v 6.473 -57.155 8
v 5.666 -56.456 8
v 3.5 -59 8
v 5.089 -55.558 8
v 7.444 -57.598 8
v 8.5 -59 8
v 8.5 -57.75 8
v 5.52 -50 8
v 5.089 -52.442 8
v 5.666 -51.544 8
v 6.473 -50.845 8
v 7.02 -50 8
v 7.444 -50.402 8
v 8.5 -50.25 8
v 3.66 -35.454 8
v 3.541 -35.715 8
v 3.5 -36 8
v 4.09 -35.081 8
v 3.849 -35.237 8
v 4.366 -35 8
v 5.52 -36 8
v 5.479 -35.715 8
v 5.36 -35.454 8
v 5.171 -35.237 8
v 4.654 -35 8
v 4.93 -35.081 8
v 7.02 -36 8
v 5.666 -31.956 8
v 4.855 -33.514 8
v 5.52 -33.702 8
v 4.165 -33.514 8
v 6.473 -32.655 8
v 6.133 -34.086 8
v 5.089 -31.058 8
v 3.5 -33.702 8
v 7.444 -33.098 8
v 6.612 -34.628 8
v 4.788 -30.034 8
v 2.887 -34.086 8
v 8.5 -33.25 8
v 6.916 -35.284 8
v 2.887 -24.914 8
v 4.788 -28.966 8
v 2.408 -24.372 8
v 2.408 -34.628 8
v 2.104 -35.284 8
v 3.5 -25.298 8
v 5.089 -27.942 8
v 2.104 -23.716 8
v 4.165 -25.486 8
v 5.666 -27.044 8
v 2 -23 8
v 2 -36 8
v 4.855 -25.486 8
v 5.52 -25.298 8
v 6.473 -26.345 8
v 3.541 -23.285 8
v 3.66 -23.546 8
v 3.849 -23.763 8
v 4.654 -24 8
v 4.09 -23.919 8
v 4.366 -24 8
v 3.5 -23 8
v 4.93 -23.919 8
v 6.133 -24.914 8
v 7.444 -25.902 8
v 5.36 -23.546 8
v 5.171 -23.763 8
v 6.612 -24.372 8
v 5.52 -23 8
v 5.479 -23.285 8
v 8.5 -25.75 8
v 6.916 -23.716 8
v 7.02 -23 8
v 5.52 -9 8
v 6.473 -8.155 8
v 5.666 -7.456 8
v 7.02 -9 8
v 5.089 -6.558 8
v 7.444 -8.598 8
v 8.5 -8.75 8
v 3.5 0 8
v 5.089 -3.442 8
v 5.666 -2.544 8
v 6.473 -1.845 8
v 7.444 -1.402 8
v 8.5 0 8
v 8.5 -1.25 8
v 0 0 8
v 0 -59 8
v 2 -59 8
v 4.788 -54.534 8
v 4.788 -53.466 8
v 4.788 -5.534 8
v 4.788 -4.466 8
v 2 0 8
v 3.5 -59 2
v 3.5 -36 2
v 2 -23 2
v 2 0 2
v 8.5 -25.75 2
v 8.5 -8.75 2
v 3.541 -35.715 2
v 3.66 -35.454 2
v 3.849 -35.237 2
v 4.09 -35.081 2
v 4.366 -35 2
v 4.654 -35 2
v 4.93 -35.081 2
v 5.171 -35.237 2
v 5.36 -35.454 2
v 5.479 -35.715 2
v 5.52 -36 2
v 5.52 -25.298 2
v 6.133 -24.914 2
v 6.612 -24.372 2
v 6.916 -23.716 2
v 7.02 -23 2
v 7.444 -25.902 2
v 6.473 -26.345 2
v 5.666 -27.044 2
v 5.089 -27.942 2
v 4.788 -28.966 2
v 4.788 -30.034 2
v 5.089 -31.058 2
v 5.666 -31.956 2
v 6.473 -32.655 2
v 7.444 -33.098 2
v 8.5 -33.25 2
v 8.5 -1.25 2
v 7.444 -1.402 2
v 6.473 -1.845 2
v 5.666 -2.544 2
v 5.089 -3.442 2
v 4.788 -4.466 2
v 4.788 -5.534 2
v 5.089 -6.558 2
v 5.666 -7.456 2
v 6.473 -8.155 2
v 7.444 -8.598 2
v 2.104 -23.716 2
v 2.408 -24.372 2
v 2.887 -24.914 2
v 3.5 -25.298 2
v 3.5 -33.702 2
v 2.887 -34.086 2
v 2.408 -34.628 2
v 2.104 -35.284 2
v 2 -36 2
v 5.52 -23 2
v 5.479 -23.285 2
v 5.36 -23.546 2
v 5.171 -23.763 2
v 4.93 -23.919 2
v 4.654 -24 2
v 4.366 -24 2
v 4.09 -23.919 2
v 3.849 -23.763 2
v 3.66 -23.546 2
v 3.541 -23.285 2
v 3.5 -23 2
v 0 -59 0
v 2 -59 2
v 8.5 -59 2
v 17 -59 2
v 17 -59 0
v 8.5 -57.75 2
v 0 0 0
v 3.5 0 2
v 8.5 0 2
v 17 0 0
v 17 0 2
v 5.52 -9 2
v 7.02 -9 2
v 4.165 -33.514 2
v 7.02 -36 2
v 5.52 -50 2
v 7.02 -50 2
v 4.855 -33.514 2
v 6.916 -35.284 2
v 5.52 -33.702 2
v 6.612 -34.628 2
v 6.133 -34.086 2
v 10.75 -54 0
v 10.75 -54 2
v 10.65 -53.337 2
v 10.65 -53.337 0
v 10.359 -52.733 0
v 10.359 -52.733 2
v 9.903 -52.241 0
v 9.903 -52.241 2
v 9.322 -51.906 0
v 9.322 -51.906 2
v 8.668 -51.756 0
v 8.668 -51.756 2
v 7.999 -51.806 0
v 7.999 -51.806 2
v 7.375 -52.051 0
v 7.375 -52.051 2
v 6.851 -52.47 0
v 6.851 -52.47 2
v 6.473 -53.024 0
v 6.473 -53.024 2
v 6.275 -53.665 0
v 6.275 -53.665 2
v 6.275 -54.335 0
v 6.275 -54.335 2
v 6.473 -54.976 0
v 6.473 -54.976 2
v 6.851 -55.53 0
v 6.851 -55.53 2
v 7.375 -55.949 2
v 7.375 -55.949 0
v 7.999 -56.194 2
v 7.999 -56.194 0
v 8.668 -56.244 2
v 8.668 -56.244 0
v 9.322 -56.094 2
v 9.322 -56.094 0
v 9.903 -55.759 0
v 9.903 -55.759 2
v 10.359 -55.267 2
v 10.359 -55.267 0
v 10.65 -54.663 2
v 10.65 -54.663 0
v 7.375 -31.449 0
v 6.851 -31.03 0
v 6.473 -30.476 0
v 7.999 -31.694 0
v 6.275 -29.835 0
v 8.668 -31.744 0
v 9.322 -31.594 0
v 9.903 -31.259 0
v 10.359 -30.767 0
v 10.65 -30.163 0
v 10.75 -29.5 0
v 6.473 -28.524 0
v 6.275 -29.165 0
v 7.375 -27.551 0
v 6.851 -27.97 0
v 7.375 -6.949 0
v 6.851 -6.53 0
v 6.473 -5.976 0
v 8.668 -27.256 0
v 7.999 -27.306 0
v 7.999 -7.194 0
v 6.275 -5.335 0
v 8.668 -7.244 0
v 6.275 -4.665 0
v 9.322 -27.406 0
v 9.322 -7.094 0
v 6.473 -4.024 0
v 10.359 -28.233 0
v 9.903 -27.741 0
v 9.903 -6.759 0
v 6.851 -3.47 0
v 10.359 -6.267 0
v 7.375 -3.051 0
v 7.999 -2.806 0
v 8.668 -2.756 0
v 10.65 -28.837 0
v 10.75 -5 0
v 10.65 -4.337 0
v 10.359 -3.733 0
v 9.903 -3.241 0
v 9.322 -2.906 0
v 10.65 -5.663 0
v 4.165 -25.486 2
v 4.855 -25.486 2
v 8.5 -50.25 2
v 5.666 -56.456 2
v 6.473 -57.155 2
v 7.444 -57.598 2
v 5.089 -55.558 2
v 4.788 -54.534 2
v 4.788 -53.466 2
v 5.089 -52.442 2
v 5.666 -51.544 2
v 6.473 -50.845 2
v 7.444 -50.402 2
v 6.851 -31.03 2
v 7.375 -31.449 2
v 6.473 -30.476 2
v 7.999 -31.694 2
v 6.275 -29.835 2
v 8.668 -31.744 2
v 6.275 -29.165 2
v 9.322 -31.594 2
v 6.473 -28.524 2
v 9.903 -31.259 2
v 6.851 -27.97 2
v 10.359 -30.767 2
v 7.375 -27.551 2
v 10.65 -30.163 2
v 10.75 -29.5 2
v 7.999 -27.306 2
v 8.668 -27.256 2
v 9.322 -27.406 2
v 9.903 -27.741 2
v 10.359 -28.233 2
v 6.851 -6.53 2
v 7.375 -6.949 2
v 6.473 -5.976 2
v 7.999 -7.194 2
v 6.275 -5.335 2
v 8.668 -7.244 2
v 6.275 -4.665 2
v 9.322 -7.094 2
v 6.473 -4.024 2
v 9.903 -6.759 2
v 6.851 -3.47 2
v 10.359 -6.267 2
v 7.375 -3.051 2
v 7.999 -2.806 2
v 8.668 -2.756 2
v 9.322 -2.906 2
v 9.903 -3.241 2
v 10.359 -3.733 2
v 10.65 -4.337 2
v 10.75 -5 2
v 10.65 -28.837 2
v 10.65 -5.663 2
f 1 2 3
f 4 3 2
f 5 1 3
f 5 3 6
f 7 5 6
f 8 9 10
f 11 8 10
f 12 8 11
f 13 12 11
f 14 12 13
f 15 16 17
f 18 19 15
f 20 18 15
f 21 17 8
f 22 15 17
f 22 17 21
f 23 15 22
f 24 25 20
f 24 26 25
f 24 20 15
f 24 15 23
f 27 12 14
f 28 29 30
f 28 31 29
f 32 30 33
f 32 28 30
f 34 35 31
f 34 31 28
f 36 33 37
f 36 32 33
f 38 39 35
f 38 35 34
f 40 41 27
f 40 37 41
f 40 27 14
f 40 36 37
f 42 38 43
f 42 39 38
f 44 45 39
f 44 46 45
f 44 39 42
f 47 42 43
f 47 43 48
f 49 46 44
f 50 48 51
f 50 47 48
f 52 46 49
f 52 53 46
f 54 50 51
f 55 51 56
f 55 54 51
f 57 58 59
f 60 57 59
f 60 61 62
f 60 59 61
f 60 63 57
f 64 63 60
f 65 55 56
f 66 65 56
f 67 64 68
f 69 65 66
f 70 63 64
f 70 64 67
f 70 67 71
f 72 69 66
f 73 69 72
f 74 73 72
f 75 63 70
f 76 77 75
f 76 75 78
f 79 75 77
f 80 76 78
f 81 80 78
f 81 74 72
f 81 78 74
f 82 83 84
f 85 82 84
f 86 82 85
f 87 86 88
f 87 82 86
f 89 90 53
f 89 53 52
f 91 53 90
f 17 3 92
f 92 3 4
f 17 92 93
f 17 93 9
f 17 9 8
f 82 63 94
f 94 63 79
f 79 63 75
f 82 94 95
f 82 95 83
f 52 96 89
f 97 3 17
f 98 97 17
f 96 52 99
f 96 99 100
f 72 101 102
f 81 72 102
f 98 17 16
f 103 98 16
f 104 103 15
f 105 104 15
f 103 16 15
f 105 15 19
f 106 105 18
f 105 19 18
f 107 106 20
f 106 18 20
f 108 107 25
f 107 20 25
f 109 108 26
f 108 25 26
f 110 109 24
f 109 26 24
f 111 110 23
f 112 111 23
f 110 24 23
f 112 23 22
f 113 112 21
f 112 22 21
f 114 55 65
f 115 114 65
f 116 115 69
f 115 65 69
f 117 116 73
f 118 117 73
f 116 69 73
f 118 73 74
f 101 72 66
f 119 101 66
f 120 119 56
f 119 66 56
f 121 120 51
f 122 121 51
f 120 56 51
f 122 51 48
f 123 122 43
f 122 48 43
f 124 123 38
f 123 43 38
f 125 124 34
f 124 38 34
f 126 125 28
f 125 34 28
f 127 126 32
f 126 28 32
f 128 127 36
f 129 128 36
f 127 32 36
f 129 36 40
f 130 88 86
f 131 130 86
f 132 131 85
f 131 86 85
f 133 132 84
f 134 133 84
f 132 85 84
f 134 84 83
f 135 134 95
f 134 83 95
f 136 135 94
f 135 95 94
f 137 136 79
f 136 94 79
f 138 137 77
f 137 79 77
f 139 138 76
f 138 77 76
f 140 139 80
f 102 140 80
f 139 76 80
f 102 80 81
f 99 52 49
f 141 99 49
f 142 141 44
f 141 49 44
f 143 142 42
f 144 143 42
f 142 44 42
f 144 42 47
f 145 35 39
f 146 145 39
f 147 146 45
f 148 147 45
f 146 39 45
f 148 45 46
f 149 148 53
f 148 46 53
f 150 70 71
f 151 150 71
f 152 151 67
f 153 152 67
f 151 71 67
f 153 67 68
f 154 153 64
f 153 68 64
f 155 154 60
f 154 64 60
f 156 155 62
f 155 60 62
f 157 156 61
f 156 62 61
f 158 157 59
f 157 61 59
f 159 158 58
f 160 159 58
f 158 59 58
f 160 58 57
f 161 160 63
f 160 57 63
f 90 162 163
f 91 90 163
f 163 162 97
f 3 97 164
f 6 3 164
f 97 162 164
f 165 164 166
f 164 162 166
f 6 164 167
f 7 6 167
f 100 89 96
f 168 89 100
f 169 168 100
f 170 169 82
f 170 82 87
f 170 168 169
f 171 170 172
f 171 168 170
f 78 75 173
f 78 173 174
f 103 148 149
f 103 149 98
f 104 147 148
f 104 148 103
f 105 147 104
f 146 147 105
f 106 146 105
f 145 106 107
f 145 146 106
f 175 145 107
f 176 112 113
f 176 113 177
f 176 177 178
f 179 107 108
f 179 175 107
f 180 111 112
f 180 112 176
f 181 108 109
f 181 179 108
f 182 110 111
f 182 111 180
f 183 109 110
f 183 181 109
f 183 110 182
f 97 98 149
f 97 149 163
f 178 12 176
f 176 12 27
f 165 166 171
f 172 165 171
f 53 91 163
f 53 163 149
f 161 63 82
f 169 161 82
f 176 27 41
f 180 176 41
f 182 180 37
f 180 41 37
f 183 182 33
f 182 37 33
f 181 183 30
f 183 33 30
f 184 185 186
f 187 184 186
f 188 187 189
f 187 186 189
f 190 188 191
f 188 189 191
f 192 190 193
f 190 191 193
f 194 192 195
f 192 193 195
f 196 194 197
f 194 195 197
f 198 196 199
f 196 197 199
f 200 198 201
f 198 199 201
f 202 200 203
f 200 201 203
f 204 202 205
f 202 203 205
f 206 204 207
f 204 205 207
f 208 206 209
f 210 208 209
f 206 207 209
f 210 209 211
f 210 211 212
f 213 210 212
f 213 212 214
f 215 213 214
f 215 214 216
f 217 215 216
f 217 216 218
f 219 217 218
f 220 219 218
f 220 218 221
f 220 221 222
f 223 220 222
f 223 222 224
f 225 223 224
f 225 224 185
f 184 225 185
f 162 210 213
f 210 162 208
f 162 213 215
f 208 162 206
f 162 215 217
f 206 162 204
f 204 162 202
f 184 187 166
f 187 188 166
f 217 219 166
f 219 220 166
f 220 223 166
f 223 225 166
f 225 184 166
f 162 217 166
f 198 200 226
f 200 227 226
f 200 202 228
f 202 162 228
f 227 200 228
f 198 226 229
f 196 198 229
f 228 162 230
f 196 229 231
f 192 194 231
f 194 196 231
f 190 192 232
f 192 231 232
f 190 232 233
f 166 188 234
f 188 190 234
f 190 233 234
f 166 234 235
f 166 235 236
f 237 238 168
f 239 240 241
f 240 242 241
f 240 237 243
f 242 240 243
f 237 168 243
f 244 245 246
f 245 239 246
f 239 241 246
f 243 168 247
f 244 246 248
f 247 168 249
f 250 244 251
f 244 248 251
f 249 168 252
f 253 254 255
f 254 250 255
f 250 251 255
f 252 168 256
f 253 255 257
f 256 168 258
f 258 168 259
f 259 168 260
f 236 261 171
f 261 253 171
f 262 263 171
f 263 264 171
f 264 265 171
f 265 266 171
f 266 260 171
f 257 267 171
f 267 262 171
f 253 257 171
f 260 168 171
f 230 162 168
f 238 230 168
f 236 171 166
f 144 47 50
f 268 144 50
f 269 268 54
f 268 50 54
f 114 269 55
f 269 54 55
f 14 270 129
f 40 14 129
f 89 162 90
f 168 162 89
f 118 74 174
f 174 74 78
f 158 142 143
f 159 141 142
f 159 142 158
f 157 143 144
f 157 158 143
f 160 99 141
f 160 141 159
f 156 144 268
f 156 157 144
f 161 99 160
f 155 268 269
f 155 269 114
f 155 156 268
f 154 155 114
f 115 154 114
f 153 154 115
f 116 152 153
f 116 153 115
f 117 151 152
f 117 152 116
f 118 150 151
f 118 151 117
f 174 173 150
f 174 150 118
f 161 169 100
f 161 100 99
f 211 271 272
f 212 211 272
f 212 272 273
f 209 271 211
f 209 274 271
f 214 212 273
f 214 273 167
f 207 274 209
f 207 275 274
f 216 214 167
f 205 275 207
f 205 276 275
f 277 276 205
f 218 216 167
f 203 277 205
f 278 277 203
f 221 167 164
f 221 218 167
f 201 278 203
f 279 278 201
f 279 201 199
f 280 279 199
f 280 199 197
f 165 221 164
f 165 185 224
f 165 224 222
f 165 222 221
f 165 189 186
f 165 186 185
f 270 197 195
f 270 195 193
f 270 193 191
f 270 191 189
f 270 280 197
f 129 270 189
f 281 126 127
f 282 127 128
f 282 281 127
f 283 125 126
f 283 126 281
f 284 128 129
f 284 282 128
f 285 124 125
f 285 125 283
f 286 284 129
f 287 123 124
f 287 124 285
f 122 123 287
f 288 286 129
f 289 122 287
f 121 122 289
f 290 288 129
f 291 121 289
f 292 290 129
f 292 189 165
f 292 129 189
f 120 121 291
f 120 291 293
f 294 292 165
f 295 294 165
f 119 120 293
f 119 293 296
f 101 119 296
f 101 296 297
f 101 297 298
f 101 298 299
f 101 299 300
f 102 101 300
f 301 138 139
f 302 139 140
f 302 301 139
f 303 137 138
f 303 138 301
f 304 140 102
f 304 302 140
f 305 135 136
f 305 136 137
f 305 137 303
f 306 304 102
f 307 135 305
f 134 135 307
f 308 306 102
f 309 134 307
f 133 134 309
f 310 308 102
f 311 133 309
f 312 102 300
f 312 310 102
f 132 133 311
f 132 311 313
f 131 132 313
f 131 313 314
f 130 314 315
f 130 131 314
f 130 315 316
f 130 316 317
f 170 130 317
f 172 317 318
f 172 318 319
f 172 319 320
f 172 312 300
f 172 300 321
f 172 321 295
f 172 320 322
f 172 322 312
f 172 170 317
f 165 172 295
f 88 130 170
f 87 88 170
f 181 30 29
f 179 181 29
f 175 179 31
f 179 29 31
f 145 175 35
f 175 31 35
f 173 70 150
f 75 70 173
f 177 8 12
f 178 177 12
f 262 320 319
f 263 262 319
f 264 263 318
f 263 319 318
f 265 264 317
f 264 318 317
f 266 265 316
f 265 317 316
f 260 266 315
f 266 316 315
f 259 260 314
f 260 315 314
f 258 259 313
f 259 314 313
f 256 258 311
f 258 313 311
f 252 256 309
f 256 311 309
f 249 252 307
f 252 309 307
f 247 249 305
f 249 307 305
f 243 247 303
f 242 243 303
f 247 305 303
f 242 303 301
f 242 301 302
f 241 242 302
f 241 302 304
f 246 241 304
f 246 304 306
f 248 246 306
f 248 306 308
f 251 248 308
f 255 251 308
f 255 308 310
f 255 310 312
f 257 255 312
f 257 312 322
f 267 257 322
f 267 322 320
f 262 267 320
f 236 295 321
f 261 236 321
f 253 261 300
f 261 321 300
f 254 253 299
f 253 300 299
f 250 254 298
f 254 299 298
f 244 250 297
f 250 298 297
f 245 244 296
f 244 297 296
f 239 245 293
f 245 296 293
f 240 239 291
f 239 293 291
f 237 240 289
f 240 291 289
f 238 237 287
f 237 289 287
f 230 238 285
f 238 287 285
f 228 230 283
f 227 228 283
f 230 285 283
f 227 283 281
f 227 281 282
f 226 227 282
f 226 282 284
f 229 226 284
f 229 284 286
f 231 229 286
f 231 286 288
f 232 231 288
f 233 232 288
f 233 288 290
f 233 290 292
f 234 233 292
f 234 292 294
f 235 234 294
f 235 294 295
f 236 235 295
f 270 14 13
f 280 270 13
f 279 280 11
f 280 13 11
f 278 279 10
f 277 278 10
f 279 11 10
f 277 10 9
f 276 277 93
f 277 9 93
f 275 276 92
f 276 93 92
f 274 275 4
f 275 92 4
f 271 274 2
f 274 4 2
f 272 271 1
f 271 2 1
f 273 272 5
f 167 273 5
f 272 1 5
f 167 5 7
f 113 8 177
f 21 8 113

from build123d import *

# Parameters (mm, degrees)
ESQUISSE1_W             = 17
ESQUISSE1_H             = 59
BOSS_EXTRU_1_DEPTH      = 2
ESQUISSE2_W             = 8.5
ESQUISSE2_H             = 59
BOSS_EXTRU_2_DEPTH      = 6
ESQUISSE3_W             = 1.5
ESQUISSE3_H             = 23
ESQUISSE3_H_2           = 14
ENL_V_MAT_EXTRU_1_DEPTH = 6
ESQUISSE4_R             = 2.25
ENL_V_MAT_EXTRU_4_DEPTH = 22
ESQUISSE6_R             = 3.75
ENL_V_MAT_EXTRU_5_DEPTH = 6


with BuildPart() as part:
    # Esquisse1 → Boss.-Extru.1 (new body)
    with BuildSketch(Plane.XY):
        with Locations((8.5, -29.5)):
            Rectangle(ESQUISSE1_W, ESQUISSE1_H)
    extrude(amount=BOSS_EXTRU_1_DEPTH)

    # Esquisse2 → Boss.-Extru.2 (add)
    with BuildSketch(Plane.XY.offset(2)):
        with Locations((4.25, -29.5)):
            Rectangle(ESQUISSE2_W, ESQUISSE2_H)
    extrude(amount=BOSS_EXTRU_2_DEPTH)

    # Esquisse3 → Enlèv. mat.-Extru.1 (cut)
    with BuildSketch(Plane.XY.offset(8)):
        with Locations((2.75, -47.5)):
            Rectangle(ESQUISSE3_W, ESQUISSE3_H)
        with BuildLine():
            ThreePointArc((3.5, -33.702199257), (2.408191843, -34.627967907), (2, -36))
            Line((2, -36), (3.5, -36))
            Line((3.5, -36), (3.5, -33.702199257))
        make_face()
        with BuildLine():
            Line((3.5, -33.702199257), (3.5, -36))
            ThreePointArc((3.5, -36), (4.509962751, -34.990037249), (5.519925502, -36))
            Line((5.519925502, -36), (5.519925502, -33.702199257))
            ThreePointArc((5.519925502, -33.702199257), (4.509962751, -33.490037249), (3.5, -33.702199257))
        make_face()
        with BuildLine():
            Line((5.519925502, -33.702199257), (5.519925502, -36))
            Line((5.519925502, -36), (7.019925502, -36))
            ThreePointArc((7.019925502, -36), (6.611733659, -34.627967907), (5.519925502, -33.702199257))
        make_face()
        with Locations((6.269925502, -43)):
            Rectangle(ESQUISSE3_W, ESQUISSE3_H_2)
        with Locations((6.269925502, -16)):
            Rectangle(ESQUISSE3_W, ESQUISSE3_H_2)
        with Locations((2.75, -11.5)):
            Rectangle(ESQUISSE3_W, ESQUISSE3_H)
        with BuildLine():
            Line((3.5, -23), (2, -23))
            ThreePointArc((2, -23), (2.408191843, -24.372032093), (3.5, -25.297800743))
            Line((3.5, -25.297800743), (3.5, -23))
        make_face()
        with BuildLine():
            ThreePointArc((5.519925502, -23), (4.509962751, -24.009962751), (3.5, -23))
            Line((3.5, -23), (3.5, -25.297800743))
            ThreePointArc((3.5, -25.297800743), (4.509962751, -25.509962751), (5.519925502, -25.297800743))
            Line((5.519925502, -25.297800743), (5.519925502, -23))
        make_face()
        with BuildLine():
            Line((7.019925502, -23), (5.519925502, -23))
            Line((5.519925502, -23), (5.519925502, -25.297800743))
            ThreePointArc((5.519925502, -25.297800743), (6.611733659, -24.372032093), (7.019925502, -23))
        make_face()
    extrude(amount=-ENL_V_MAT_EXTRU_1_DEPTH, mode=Mode.SUBTRACT)

    # Esquisse4 → Enlèv. mat.-Extru.4 (cut)
    with BuildSketch(Plane.XY.offset(8)):
        with Locations((8.5, -29.5)):
            Circle(ESQUISSE4_R)
        with Locations((8.5, -54)):
            Circle(ESQUISSE4_R)
        with Locations((8.5, -5)):
            Circle(ESQUISSE4_R)
    extrude(amount=-ENL_V_MAT_EXTRU_4_DEPTH, mode=Mode.SUBTRACT)

    # Esquisse6 → Enlèv. mat.-Extru.5 (cut)
    with BuildSketch(Plane.XY.offset(8)):
        with Locations((8.5, -29.5)):
            Circle(ESQUISSE6_R)
        with Locations((8.5, -5)):
            Circle(ESQUISSE6_R)
        with Locations((8.5, -54)):
            Circle(ESQUISSE6_R)
    extrude(amount=-ENL_V_MAT_EXTRU_5_DEPTH, mode=Mode.SUBTRACT)


solid = part.part
